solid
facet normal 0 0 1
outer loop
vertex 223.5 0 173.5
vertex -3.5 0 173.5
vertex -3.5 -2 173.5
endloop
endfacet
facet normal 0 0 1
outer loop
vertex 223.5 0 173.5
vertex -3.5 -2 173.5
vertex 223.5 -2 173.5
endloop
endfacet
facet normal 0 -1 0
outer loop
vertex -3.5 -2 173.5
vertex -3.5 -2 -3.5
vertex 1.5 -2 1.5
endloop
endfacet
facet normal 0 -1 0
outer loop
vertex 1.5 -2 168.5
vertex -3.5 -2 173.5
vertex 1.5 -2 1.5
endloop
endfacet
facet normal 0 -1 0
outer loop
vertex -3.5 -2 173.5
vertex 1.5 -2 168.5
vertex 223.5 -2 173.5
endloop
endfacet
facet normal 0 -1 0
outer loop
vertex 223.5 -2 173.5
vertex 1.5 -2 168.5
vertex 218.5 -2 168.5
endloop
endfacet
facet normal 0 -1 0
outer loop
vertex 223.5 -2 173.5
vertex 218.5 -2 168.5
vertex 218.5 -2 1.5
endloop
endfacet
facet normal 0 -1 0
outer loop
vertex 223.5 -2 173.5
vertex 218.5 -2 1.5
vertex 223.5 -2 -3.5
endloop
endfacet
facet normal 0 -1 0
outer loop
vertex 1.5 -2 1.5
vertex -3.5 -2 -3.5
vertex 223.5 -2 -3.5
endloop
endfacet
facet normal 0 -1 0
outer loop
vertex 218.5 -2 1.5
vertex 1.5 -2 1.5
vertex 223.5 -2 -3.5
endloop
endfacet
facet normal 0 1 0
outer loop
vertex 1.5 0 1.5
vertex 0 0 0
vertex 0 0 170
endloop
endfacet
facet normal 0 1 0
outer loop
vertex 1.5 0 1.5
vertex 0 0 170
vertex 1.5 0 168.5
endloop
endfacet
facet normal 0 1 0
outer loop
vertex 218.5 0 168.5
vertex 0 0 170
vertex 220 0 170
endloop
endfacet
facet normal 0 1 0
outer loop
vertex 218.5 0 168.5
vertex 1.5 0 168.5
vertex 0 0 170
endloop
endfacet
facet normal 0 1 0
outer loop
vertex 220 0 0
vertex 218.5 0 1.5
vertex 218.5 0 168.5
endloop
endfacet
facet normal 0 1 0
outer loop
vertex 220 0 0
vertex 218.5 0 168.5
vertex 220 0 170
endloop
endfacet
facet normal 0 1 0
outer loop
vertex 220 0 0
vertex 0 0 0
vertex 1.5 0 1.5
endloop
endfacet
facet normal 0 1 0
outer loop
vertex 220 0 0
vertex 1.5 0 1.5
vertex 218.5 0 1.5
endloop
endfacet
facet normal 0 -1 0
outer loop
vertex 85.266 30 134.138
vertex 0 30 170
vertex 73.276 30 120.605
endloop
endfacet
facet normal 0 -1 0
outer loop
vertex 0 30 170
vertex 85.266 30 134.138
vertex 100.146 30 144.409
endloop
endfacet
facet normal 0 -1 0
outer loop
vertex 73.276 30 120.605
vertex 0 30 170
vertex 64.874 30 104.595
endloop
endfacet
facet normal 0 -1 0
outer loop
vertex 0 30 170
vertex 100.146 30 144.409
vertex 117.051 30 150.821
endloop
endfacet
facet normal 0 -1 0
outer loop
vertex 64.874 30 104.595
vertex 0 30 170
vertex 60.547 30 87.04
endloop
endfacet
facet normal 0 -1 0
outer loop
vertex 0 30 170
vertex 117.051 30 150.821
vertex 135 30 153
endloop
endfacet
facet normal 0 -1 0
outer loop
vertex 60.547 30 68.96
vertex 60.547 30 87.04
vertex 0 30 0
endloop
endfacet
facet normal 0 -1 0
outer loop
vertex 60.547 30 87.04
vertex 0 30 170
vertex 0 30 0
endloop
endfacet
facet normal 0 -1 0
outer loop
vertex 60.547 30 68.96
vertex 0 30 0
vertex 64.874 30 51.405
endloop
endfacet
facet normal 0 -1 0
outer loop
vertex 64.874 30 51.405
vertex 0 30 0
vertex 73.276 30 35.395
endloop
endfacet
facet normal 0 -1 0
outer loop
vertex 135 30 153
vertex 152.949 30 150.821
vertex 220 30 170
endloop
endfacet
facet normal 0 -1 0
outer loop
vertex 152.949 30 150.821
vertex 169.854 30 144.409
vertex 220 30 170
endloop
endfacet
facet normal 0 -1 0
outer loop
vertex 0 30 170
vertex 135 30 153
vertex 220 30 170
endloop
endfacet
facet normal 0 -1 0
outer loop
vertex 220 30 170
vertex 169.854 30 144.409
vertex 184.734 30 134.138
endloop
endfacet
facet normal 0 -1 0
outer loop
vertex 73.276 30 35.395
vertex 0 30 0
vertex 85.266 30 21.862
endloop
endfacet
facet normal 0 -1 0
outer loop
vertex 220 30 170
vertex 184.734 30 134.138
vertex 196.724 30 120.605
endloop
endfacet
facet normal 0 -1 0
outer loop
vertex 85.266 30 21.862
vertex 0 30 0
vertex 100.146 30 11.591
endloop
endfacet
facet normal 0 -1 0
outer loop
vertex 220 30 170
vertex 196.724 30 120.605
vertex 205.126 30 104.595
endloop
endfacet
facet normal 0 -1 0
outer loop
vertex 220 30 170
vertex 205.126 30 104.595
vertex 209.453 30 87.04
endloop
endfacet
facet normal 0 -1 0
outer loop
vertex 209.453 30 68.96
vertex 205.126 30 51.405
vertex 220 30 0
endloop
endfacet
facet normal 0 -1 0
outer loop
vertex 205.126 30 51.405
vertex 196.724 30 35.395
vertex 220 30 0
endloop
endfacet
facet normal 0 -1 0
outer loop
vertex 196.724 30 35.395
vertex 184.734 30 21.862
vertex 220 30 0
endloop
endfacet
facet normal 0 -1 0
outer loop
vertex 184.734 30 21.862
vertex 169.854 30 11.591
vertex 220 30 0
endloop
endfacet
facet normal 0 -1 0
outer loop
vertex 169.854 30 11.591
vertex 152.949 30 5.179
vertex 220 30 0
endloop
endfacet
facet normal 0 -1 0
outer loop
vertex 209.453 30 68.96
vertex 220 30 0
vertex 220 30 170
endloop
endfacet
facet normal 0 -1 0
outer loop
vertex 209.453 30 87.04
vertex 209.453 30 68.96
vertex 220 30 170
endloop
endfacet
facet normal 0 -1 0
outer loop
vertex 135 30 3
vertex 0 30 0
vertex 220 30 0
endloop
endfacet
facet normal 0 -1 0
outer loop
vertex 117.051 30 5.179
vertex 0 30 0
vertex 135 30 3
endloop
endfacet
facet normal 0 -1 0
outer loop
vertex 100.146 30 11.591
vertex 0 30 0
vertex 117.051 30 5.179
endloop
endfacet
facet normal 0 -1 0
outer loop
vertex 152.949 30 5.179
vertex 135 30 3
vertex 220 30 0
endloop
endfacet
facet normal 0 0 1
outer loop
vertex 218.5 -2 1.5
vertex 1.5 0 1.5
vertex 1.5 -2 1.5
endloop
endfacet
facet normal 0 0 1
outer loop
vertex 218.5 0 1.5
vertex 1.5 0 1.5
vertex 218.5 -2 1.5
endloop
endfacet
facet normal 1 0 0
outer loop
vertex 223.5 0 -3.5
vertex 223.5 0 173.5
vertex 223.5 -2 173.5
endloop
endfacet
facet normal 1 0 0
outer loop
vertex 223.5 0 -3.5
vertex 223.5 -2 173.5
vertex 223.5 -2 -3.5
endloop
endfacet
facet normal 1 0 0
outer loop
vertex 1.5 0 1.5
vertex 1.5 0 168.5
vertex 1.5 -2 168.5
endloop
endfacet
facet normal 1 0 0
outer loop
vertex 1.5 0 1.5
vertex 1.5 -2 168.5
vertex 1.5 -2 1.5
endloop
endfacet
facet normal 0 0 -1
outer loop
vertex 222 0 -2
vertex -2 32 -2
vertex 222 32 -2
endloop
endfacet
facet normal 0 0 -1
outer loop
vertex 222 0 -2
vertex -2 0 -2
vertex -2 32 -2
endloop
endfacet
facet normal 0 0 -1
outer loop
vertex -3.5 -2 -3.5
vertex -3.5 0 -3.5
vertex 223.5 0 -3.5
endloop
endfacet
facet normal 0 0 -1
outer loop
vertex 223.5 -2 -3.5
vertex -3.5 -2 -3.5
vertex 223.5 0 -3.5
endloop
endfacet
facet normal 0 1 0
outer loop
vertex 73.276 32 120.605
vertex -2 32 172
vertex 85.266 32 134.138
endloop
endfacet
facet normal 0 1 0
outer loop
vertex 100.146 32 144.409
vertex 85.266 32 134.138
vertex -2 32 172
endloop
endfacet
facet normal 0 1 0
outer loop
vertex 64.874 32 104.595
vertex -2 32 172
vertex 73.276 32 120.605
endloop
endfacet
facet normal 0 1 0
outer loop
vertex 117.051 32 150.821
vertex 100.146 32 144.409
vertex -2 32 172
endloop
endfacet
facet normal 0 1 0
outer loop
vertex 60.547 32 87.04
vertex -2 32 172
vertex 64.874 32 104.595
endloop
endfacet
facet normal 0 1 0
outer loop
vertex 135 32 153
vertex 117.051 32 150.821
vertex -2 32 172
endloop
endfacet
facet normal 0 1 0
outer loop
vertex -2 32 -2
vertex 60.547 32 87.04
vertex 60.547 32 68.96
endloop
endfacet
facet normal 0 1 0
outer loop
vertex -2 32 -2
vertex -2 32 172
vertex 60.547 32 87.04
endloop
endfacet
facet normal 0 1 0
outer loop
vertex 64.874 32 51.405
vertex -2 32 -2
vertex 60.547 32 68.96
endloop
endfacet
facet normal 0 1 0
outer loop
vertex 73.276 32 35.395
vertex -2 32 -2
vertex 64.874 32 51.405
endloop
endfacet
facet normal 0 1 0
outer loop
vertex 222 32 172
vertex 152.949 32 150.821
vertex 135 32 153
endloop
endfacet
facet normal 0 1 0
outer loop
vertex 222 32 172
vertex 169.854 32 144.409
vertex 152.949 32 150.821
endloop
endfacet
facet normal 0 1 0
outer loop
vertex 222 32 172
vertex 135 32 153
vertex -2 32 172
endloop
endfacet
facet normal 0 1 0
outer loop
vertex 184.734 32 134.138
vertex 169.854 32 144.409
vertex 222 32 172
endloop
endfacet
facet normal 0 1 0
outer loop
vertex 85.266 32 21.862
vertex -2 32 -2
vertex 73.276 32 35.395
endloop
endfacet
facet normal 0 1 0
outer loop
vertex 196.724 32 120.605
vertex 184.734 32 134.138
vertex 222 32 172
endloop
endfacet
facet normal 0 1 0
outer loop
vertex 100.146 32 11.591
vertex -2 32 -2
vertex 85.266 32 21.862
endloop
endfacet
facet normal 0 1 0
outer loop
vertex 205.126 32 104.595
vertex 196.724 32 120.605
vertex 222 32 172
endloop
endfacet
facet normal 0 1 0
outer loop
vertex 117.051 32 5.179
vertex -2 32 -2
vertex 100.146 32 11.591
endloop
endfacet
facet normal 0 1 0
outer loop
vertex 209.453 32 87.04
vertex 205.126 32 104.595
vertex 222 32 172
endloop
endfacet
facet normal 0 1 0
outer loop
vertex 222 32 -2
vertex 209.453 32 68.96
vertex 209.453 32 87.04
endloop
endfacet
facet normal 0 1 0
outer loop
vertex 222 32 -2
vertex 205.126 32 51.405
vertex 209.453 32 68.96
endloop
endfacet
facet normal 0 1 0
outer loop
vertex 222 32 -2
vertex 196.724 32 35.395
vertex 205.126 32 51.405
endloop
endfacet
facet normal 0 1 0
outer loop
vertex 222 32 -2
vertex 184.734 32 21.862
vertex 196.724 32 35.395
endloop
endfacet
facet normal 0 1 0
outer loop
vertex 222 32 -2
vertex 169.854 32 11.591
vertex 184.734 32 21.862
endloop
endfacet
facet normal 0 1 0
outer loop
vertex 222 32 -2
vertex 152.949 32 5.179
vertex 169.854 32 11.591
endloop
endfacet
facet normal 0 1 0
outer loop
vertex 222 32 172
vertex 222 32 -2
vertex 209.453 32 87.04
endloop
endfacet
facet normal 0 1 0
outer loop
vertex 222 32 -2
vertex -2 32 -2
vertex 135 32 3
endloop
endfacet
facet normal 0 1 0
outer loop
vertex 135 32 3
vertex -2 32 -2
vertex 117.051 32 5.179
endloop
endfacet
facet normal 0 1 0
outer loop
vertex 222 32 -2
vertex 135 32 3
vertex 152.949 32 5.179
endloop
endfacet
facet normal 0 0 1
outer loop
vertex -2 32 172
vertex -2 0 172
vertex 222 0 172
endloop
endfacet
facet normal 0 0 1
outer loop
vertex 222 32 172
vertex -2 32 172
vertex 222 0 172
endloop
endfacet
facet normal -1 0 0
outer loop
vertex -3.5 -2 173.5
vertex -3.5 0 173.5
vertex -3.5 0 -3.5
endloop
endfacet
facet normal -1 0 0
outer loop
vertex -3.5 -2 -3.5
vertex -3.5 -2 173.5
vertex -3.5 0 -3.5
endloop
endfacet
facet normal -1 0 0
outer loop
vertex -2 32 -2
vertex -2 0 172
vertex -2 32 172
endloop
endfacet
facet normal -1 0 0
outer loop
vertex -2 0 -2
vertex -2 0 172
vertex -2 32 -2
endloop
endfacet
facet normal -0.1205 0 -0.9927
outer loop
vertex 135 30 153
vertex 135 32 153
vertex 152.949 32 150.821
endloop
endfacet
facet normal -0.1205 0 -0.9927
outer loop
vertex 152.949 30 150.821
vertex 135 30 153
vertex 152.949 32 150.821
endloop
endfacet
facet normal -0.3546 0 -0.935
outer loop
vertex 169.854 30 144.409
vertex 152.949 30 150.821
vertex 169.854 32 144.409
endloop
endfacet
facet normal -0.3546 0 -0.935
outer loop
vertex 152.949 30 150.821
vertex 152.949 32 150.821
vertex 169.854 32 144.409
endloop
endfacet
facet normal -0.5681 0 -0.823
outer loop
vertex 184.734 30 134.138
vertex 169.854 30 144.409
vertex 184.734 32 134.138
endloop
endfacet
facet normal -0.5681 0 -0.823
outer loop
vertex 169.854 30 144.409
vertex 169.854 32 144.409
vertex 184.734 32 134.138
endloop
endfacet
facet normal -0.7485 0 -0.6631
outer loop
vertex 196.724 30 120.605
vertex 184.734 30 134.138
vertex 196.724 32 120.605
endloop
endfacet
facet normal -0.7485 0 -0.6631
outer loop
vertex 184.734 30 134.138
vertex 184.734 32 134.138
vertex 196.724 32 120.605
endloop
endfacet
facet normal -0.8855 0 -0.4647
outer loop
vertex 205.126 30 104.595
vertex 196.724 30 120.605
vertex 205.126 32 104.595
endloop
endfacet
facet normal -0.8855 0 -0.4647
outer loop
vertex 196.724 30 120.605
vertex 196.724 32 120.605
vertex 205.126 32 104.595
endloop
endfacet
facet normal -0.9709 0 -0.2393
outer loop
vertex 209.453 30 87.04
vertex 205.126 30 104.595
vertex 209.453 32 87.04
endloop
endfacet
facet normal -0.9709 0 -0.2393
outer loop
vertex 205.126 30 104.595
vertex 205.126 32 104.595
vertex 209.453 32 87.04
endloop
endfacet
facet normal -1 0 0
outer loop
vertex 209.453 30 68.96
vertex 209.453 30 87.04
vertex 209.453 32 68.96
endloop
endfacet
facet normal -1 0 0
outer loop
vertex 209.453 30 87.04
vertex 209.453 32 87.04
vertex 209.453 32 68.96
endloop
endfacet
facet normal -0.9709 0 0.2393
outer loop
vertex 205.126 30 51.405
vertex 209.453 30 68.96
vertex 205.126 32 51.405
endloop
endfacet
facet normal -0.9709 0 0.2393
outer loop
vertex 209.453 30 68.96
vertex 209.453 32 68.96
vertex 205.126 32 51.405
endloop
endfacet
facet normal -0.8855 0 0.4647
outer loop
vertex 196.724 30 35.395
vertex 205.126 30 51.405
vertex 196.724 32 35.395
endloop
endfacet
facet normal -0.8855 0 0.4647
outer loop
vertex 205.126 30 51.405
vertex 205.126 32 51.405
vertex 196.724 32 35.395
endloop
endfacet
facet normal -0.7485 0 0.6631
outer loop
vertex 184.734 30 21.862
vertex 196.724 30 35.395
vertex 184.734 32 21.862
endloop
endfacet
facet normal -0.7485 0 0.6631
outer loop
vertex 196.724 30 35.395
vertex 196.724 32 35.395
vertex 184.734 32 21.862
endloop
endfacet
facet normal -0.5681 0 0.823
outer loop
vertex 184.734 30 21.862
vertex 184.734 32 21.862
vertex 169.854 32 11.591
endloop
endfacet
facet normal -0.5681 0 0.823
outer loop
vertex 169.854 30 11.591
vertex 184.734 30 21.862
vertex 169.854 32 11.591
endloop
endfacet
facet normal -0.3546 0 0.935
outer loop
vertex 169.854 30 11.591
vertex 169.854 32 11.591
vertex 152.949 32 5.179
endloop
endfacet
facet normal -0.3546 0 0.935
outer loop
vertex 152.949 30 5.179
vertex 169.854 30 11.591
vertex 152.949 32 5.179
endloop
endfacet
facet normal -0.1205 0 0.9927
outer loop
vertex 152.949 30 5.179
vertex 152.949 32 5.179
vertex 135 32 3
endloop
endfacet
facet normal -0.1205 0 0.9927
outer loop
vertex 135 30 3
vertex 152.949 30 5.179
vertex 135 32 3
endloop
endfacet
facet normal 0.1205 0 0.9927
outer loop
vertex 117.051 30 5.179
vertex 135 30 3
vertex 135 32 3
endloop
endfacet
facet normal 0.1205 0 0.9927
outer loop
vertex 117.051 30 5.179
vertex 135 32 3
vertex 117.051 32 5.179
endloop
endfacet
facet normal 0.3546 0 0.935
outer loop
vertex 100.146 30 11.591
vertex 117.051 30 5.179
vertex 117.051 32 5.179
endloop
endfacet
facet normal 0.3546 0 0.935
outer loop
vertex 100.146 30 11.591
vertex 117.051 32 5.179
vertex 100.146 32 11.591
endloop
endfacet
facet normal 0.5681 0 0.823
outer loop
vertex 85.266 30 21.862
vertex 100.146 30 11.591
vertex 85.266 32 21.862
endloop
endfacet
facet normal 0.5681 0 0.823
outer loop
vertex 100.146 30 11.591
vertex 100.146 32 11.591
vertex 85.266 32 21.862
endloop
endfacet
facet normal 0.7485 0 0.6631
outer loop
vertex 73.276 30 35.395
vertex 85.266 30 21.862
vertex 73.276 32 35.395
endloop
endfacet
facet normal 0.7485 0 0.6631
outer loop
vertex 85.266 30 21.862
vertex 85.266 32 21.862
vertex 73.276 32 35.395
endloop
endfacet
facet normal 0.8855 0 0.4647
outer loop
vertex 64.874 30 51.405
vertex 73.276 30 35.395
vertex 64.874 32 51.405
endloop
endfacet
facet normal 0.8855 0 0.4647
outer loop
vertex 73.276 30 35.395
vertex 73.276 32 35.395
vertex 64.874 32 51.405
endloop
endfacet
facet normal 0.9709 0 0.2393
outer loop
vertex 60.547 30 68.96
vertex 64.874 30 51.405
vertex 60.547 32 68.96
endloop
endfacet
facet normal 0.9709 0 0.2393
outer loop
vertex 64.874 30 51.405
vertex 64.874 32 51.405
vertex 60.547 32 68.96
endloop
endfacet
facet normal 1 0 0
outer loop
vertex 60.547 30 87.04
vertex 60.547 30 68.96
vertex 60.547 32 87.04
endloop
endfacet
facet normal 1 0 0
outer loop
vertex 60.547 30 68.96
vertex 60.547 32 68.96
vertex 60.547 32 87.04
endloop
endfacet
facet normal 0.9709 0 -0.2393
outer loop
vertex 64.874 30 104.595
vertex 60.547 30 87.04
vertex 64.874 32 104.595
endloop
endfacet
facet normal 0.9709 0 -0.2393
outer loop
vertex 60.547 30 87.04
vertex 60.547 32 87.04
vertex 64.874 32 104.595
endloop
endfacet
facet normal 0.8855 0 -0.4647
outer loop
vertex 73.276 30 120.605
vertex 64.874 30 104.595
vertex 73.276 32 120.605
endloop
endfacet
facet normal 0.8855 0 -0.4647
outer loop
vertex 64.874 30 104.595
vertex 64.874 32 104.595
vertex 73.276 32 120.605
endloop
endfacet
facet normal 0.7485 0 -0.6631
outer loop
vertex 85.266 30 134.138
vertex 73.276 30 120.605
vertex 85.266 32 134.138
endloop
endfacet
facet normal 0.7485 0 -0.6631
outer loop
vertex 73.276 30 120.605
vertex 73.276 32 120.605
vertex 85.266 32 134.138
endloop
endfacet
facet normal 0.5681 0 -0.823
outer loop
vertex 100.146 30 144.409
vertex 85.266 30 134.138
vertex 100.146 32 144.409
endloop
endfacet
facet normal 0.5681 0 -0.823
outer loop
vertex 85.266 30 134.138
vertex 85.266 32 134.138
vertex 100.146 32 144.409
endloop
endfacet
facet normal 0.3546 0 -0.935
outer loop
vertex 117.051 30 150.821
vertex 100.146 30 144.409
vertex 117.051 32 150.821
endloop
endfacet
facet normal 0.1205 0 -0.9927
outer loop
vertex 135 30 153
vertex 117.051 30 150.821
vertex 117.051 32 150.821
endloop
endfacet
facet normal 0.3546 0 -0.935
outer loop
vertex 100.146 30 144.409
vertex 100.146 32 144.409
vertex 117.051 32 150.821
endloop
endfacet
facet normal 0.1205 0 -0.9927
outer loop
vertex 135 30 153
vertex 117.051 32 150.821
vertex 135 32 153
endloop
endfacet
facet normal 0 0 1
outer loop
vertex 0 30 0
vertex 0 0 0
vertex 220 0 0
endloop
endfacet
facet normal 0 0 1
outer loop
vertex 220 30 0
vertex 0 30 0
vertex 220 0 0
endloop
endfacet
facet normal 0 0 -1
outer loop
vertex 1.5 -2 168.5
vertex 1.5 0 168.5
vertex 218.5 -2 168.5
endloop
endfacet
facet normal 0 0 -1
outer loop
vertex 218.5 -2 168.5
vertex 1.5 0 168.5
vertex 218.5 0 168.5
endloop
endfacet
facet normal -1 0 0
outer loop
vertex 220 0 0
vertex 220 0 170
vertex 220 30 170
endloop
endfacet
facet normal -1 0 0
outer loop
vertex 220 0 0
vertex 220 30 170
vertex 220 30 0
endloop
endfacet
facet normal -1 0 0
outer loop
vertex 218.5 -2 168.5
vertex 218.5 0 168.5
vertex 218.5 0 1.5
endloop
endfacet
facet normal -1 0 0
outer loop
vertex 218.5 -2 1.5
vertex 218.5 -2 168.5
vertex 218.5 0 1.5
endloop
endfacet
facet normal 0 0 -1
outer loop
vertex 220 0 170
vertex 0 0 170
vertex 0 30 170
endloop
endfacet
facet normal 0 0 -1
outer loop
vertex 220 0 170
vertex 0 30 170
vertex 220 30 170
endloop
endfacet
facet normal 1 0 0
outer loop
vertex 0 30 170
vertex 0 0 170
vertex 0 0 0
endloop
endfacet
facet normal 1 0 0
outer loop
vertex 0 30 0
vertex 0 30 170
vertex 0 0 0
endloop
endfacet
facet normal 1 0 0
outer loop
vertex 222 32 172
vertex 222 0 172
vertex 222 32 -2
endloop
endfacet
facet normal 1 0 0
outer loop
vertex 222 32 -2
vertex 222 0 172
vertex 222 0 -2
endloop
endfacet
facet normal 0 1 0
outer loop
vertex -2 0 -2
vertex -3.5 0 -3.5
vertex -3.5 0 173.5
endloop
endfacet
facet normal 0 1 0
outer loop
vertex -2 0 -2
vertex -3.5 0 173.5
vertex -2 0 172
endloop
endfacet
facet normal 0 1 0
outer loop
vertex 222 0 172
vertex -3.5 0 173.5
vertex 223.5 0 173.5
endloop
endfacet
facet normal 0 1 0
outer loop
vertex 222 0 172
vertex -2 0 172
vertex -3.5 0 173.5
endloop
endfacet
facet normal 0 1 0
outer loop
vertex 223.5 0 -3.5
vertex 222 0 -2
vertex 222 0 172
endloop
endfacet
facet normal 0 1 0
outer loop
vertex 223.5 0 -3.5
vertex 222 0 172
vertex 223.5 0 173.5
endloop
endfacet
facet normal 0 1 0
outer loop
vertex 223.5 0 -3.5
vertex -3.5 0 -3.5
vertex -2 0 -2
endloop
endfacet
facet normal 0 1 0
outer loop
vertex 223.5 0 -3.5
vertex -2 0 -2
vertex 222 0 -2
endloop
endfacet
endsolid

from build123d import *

# Parameters (mm, degrees)
SKETCH_1_W      = 224
SKETCH_1_H      = 174
SKETCH_1_W_2    = 220
SKETCH_1_H_2    = 170
EXTRUDE_1_DEPTH = 32
SKETCH_2_W      = 227
SKETCH_2_H      = 177
SKETCH_2_W_2    = 217
SKETCH_2_H_2    = 167
EXTRUDE_2_DEPTH = 2
SKETCH_3_W      = 222
SKETCH_3_H      = 172
SKETCH_3_R      = 75
EXTRUDE_3_DEPTH = 2


with BuildPart() as part:
    # 草图1 → 凸台-拉伸1 (new body)
    with BuildSketch(Plane(origin=(0, 0, 0), x_dir=(1, 0, 0), z_dir=(0, 1, 0))):
        with Locations((110, -85)):
            Rectangle(SKETCH_1_W, SKETCH_1_H)
        with Locations((110, -85)):
            Rectangle(SKETCH_1_W_2, SKETCH_1_H_2, mode=Mode.SUBTRACT)
    extrude(amount=EXTRUDE_1_DEPTH)

    # 草图2 → 凸台-拉伸2 (add)
    with BuildSketch(Plane(origin=(0, 0, 0), x_dir=(1, 0, 0), z_dir=(0, 1, 0))):
        with Locations((110, -85)):
            Rectangle(SKETCH_2_W, SKETCH_2_H)
        with Locations((110, -85)):
            Rectangle(SKETCH_2_W_2, SKETCH_2_H_2, mode=Mode.SUBTRACT)
    extrude(amount=-EXTRUDE_2_DEPTH)

    # 草图3 → 凸台-拉伸3 (add)
    with BuildSketch(Plane(origin=(0, 32, 0), x_dir=(1, 0, 0), z_dir=(0, 1, 0))):
        with Locations((109, -84)):
            Rectangle(SKETCH_3_W, SKETCH_3_H)
        with Locations(Location((135, -78, 0), (0, 0, 270))):
            Circle(SKETCH_3_R, mode=Mode.SUBTRACT)
    extrude(amount=-EXTRUDE_3_DEPTH)


solid = part.part
